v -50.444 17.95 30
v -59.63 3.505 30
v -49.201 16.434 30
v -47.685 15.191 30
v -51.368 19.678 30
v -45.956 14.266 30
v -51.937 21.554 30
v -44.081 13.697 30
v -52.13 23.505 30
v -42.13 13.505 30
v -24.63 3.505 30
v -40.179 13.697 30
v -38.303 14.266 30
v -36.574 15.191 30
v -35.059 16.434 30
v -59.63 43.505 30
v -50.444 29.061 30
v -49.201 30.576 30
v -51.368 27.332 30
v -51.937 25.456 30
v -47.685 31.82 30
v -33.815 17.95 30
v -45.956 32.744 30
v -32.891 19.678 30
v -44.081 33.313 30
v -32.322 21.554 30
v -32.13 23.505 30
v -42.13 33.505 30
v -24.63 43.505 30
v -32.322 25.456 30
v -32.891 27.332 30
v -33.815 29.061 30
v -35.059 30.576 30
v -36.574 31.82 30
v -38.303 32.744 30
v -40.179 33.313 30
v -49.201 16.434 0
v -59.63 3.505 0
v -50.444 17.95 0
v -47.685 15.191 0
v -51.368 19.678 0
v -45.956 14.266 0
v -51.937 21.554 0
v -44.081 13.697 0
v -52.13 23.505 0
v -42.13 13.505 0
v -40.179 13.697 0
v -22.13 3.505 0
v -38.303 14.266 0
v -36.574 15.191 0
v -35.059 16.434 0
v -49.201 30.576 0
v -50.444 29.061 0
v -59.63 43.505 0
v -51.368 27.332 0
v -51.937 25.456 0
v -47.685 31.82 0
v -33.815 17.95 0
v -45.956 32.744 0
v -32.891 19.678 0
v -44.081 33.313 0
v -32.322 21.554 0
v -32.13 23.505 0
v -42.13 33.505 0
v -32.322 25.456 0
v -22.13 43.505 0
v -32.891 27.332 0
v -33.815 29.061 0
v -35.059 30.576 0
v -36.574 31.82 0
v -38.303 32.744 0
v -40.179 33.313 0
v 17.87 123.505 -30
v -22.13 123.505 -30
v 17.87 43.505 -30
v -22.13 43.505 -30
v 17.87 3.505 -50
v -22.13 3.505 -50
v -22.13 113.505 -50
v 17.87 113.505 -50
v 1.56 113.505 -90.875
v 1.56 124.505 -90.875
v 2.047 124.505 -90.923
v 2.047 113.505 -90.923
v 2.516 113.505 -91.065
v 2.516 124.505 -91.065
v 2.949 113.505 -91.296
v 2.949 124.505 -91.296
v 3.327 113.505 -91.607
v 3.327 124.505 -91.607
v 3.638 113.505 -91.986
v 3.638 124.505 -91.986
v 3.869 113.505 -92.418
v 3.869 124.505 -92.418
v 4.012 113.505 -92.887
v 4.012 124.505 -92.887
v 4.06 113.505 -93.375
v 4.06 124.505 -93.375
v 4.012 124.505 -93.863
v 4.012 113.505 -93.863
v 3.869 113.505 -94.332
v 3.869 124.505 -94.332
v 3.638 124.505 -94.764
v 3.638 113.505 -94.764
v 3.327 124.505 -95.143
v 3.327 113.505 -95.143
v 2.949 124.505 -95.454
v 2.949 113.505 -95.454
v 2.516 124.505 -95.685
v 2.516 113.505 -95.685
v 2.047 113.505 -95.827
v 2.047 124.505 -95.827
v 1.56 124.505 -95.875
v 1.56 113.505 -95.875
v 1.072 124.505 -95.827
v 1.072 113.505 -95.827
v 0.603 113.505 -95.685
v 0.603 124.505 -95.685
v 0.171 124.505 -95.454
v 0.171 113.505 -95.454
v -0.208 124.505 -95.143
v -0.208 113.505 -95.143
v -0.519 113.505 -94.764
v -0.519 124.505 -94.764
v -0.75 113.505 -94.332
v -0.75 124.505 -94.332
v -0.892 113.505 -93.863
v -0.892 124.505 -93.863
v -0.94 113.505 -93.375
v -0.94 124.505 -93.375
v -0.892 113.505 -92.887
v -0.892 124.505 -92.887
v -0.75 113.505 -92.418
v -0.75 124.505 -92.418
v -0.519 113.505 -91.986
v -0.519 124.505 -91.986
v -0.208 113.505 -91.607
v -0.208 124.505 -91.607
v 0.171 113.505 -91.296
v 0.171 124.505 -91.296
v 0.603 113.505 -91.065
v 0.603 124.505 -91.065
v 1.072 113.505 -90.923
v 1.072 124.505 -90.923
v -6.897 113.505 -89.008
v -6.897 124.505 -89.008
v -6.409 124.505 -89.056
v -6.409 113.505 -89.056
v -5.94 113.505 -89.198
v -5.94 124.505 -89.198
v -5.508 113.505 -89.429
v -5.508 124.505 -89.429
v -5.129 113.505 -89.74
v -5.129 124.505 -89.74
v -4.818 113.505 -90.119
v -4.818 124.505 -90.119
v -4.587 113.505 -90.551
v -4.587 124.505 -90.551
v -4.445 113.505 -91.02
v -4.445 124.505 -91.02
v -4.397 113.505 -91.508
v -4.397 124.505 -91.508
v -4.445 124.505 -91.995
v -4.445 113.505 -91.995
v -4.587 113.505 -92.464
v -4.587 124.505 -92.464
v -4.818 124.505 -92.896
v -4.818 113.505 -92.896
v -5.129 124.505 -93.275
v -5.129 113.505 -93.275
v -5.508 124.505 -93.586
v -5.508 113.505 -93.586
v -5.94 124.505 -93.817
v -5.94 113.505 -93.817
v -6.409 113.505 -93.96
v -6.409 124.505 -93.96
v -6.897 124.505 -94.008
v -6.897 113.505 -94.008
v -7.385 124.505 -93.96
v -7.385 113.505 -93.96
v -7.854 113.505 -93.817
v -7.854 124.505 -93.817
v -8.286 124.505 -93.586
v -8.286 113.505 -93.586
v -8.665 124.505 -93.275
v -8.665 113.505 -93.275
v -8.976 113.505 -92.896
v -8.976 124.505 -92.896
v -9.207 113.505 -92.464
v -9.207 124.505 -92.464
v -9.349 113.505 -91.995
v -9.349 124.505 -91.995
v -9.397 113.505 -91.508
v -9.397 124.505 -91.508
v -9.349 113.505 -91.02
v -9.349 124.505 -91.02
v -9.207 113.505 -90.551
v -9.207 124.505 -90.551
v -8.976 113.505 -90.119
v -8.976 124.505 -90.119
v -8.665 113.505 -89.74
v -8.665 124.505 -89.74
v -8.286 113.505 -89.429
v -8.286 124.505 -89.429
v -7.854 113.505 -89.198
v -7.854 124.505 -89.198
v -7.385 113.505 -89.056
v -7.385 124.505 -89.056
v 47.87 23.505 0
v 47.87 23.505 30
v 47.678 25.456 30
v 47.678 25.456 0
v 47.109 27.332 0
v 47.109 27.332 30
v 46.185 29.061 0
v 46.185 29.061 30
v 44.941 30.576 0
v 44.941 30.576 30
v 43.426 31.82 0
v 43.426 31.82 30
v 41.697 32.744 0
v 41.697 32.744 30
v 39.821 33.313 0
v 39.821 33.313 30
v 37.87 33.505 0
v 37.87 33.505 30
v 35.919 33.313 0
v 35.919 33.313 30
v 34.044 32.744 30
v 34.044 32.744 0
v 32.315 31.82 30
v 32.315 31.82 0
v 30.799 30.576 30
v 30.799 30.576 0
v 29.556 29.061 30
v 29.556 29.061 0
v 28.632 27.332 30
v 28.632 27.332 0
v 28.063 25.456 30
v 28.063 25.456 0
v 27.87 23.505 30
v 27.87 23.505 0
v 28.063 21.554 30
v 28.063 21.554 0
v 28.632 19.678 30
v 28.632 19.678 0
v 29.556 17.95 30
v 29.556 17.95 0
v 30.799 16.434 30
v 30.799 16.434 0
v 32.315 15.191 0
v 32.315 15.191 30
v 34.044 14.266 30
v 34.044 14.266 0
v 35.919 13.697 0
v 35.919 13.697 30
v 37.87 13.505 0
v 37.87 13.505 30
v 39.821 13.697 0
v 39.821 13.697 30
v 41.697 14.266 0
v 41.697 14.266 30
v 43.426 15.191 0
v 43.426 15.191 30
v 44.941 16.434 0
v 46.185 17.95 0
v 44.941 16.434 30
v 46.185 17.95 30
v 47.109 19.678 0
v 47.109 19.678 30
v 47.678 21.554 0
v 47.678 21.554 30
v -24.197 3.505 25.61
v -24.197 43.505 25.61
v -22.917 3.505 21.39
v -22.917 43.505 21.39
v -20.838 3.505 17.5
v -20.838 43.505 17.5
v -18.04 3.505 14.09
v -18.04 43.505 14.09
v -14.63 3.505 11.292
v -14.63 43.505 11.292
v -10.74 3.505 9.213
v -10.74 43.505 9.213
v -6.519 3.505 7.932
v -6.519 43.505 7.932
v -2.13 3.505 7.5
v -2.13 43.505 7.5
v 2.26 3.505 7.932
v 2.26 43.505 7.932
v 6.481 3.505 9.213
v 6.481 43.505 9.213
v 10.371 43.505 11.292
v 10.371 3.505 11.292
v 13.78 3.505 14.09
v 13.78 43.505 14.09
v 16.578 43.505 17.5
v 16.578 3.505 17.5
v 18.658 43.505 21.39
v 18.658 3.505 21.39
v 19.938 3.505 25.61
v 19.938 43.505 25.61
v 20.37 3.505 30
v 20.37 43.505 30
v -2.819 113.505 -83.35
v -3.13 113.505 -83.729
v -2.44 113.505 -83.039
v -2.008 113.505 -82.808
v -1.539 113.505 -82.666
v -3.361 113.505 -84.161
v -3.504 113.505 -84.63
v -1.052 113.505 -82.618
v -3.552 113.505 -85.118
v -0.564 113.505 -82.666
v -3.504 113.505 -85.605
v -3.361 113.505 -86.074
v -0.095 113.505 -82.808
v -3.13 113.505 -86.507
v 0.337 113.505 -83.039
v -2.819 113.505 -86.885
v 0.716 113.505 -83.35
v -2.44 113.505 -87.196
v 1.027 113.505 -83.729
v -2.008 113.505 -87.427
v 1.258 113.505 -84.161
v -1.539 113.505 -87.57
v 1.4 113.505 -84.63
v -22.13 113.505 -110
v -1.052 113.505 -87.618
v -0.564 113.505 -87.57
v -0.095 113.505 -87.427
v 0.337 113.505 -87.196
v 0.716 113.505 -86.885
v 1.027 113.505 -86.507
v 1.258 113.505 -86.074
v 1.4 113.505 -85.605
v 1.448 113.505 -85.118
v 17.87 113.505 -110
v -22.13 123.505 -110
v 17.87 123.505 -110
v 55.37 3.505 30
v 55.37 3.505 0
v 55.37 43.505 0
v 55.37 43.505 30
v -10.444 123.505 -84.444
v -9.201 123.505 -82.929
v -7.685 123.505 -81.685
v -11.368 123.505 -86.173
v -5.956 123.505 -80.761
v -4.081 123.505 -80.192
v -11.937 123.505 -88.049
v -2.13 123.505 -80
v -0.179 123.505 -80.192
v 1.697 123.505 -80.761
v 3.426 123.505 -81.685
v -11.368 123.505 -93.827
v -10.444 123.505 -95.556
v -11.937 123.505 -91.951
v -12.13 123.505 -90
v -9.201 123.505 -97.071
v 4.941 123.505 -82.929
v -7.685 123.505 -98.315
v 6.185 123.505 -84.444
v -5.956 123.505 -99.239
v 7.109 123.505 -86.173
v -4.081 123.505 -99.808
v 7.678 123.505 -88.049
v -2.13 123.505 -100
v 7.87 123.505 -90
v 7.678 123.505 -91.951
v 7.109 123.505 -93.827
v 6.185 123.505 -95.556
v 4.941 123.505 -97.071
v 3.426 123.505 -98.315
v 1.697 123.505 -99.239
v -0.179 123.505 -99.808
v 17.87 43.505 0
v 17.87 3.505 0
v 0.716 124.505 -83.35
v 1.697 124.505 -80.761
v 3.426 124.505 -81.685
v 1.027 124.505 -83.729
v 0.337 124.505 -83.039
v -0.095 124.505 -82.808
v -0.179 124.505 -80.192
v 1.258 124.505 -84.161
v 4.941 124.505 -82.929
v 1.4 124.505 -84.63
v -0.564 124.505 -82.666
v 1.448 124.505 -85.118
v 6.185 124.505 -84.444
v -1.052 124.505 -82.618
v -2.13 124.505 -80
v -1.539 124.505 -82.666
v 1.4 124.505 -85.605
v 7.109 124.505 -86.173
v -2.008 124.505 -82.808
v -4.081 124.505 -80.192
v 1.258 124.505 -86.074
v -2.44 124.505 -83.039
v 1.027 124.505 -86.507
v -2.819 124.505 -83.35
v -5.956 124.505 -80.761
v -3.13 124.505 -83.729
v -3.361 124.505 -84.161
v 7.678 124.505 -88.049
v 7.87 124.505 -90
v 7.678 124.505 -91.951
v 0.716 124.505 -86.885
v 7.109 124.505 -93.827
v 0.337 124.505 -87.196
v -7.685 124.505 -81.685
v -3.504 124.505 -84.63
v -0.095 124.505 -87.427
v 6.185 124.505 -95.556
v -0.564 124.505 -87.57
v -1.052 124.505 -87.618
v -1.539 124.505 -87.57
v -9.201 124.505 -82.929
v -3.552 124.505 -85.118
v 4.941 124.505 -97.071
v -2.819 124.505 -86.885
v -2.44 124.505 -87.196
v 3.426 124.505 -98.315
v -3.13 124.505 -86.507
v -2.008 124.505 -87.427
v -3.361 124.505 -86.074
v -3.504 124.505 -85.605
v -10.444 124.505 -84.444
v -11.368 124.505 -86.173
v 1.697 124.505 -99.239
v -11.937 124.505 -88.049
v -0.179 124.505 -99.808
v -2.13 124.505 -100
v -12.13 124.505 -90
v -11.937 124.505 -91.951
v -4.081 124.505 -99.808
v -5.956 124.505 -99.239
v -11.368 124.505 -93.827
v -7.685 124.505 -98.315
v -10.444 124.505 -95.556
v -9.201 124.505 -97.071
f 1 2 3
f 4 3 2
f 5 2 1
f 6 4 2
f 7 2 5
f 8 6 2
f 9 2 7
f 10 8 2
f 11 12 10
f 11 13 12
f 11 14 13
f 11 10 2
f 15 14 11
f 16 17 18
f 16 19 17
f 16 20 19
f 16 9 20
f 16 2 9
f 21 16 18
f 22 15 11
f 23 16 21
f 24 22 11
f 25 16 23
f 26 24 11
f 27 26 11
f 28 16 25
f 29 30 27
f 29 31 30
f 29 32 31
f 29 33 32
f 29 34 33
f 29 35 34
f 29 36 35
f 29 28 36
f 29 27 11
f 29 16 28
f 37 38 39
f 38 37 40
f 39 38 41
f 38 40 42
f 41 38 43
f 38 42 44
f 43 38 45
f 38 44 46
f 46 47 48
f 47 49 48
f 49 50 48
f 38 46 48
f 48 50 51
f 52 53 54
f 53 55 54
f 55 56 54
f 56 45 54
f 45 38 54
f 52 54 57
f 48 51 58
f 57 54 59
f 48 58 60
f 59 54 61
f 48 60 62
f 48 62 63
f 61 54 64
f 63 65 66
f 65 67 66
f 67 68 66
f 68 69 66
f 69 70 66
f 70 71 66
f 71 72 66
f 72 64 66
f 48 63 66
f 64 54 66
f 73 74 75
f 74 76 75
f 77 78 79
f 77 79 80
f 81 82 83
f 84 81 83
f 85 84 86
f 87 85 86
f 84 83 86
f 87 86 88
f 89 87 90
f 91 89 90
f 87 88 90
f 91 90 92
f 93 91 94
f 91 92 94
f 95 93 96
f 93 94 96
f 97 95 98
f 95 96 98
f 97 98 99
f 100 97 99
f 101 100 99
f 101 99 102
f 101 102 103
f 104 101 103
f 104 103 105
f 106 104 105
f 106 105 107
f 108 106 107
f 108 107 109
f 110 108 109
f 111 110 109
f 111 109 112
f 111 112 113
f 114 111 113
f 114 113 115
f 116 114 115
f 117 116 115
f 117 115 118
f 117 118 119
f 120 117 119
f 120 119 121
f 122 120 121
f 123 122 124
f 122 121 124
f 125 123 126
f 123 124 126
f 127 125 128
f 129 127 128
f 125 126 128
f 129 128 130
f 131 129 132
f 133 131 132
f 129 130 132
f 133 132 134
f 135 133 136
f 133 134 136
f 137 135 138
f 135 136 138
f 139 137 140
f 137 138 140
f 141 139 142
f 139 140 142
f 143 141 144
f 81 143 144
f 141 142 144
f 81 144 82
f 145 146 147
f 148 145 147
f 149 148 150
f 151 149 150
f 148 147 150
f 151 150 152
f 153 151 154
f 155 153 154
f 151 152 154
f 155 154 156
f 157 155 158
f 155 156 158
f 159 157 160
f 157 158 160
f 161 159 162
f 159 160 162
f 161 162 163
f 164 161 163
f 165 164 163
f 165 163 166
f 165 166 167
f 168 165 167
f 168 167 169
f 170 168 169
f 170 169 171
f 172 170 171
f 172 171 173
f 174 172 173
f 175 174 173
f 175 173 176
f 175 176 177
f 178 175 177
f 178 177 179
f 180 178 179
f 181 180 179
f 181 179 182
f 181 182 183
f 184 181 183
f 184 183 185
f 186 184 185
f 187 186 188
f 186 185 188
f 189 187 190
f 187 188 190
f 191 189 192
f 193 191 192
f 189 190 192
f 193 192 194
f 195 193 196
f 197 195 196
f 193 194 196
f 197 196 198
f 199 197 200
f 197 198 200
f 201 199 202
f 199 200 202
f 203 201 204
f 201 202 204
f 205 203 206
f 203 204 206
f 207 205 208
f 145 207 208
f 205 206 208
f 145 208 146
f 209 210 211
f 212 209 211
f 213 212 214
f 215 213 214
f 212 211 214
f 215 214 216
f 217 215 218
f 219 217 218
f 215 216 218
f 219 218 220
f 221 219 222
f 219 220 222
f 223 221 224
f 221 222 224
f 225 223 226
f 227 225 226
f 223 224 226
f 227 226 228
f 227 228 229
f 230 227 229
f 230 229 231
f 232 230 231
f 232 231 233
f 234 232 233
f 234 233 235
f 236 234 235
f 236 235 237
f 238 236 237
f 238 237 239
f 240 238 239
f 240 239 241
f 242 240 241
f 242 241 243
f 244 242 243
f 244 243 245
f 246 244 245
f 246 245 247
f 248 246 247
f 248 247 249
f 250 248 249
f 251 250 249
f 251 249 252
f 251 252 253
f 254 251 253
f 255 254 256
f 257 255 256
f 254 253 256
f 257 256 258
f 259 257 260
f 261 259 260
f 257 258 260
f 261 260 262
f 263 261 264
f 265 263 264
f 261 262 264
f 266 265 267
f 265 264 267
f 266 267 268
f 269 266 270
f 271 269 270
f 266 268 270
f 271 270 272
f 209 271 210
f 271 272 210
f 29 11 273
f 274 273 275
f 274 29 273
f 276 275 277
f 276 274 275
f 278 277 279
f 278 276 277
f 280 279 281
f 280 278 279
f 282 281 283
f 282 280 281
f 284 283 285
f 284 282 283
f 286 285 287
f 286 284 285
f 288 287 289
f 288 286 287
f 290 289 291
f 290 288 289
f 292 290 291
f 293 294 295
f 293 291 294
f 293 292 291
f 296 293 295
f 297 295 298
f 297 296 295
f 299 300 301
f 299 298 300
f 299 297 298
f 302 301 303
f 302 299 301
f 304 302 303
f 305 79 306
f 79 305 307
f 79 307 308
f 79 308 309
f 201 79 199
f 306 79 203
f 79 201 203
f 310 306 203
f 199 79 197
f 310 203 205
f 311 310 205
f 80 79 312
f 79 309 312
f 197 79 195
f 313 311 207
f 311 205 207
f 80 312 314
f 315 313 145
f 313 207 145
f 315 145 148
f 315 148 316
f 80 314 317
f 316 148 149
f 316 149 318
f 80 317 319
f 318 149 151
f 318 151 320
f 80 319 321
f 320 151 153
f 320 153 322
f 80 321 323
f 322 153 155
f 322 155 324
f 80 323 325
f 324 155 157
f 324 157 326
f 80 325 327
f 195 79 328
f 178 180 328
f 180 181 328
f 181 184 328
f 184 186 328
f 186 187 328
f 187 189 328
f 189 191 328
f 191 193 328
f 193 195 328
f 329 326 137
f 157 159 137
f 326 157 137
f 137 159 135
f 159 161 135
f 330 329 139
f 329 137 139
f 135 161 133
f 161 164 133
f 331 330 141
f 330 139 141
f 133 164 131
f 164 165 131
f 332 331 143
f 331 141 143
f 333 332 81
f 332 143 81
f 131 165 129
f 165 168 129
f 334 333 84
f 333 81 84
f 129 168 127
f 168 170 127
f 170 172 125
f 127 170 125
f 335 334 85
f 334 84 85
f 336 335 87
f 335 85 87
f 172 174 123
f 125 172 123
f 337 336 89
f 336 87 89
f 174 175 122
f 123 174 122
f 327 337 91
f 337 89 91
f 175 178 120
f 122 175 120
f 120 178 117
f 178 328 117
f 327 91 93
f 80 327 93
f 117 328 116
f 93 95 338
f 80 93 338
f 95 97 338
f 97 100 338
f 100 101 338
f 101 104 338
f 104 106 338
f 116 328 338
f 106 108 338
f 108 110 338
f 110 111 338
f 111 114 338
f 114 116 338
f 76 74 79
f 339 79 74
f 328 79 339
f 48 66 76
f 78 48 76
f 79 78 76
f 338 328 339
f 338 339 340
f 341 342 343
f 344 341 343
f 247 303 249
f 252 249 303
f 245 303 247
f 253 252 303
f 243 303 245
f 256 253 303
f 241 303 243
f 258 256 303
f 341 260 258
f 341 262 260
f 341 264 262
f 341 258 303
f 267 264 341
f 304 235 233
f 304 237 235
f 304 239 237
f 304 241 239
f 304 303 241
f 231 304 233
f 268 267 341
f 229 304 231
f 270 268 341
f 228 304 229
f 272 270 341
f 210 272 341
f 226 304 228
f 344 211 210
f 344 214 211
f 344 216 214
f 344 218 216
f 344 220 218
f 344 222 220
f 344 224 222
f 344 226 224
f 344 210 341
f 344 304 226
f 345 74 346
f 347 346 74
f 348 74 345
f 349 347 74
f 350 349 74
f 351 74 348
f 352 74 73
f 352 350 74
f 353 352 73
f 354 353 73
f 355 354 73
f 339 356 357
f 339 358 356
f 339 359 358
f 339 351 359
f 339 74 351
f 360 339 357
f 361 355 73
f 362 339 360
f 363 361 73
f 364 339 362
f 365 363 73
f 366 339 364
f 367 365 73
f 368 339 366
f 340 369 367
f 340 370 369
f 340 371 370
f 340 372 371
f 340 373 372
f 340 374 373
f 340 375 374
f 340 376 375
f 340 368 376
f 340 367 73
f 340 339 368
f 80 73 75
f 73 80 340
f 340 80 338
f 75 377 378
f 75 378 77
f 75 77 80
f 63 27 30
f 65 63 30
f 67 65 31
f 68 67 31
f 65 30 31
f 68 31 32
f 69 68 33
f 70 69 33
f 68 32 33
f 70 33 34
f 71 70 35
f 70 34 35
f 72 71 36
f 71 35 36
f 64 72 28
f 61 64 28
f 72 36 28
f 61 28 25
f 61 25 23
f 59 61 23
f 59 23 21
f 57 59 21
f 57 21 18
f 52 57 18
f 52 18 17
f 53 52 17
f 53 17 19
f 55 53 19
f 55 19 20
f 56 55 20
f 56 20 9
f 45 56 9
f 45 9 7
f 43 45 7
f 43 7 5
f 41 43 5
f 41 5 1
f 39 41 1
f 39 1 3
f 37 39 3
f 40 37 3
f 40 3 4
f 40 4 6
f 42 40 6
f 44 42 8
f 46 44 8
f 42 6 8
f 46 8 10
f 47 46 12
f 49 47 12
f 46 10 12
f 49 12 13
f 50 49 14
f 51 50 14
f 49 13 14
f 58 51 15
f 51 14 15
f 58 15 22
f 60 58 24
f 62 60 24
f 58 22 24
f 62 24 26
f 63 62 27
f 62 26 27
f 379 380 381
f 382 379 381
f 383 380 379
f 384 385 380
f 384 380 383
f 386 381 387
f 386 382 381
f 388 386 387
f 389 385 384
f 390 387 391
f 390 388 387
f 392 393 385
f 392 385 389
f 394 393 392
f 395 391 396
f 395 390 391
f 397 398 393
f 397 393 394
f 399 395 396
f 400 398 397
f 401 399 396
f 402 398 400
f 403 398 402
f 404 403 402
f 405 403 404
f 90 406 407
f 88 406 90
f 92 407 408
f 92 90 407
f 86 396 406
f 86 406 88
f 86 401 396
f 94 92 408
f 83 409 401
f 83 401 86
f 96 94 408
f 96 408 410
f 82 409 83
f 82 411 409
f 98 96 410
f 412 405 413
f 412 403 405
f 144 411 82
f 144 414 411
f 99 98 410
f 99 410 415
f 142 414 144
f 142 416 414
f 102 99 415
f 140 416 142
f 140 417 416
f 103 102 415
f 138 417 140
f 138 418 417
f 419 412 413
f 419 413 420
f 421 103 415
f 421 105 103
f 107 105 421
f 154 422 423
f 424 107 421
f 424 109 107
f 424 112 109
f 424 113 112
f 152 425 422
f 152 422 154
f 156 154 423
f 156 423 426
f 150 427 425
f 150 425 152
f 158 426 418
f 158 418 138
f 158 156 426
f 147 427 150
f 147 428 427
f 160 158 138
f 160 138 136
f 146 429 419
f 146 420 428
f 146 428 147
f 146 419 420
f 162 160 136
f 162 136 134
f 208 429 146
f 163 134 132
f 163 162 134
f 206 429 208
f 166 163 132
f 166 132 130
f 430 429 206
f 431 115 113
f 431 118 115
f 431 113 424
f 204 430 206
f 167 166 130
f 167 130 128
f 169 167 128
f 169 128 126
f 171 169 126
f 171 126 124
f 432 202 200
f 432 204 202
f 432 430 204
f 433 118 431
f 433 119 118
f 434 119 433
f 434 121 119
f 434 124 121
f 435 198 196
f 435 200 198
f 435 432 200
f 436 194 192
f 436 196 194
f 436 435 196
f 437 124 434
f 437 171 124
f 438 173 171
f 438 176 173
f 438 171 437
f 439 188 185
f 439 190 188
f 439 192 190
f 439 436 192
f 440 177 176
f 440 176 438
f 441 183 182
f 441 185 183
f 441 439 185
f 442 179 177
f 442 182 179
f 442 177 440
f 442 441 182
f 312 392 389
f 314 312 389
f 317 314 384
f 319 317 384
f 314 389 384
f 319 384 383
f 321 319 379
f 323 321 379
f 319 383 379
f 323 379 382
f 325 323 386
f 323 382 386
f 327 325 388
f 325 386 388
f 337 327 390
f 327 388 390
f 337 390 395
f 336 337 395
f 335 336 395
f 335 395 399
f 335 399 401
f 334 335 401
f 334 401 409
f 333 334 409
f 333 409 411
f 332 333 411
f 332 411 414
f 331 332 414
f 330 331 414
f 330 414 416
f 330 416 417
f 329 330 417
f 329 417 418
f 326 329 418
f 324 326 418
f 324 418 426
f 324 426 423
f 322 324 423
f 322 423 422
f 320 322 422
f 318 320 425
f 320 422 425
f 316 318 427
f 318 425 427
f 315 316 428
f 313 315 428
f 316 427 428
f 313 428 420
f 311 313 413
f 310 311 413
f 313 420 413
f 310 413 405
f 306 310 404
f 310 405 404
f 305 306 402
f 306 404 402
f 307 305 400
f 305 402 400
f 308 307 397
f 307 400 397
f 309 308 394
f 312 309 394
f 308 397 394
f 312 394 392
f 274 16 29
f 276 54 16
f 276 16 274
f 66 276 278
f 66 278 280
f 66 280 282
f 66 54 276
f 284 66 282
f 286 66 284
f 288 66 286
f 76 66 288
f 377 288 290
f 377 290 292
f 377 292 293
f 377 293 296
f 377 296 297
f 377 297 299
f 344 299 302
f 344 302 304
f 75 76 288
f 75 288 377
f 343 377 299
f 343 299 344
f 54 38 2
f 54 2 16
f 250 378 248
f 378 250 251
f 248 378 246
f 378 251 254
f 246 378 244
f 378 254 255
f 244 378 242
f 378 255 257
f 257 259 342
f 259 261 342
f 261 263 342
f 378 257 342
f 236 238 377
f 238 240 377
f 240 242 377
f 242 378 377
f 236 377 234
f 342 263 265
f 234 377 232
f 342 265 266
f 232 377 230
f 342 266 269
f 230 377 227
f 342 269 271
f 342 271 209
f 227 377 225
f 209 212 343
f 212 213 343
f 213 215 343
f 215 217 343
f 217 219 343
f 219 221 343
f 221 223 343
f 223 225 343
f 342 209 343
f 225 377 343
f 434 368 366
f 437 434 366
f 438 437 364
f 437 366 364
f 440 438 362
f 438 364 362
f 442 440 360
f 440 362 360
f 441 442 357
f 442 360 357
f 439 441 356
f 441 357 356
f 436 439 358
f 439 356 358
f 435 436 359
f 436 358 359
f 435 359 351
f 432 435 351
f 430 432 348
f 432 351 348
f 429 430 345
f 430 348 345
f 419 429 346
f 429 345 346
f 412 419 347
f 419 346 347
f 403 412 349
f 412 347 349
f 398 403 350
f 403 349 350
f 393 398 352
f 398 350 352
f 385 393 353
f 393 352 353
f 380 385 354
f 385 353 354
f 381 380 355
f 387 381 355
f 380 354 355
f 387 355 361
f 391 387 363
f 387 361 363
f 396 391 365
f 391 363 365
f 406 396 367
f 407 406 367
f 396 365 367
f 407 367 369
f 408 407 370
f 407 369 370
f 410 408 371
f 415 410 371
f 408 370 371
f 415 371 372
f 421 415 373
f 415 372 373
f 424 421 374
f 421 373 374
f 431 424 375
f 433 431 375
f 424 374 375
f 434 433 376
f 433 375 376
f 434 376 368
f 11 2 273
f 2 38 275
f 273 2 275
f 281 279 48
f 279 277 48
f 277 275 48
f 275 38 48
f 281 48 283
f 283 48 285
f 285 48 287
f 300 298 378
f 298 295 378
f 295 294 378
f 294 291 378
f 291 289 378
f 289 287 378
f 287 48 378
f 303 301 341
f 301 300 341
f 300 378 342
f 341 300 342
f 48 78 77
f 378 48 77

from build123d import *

# Parameters (mm, degrees)
SKETCH2_W           = 115
SKETCH2_H           = 40
BOSS_EXTRUDE1_DEPTH = 60
CUT_EXTRUDE1_DEPTH  = 60
SKETCH4_R           = 10
CUT_EXTRUDE2_DEPTH  = 60
SKETCH5_W           = 40
SKETCH5_H           = 40
BOSS_EXTRUDE2_DEPTH = 50
SKETCH6_W           = 40
SKETCH6_H           = 20
BOSS_EXTRUDE3_DEPTH = 70
SKETCH7_W           = 40
SKETCH7_H           = 80
BOSS_EXTRUDE4_DEPTH = 10
SKETCH9_R           = 10
BOSS_EXTRUDE5_DEPTH = 1
SKETCH10_R          = 2.5
CUT_EXTRUDE3_DEPTH  = 15


with BuildPart() as part:
    # Sketch2 → Boss-Extrude1 (new body)
    with BuildSketch(Plane.XY):
        with Locations((-2.12962963, 23.505291005)):
            Rectangle(SKETCH2_W, SKETCH2_H)
    extrude(amount=BOSS_EXTRUDE1_DEPTH)

    # Sketch3 → Cut-Extrude1 (cut)
    with BuildSketch(Plane(origin=(0, 43.505291005, 0), x_dir=(1, 0, 0), z_dir=(0, 1, 0))):
        with BuildLine():
            Line((-59.62962963, -30), (-24.62962963, -30))
            ThreePointArc((-24.62962963, -30), (-2.12962963, -7.5), (20.37037037, -30))
            Line((20.37037037, -30), (55.37037037, -30))
            Line((55.37037037, -30), (55.37037037, -60))
            Line((55.37037037, -60), (-59.62962963, -60))
            Line((-59.62962963, -60), (-59.62962963, -30))
        make_face()
    extrude(amount=-CUT_EXTRUDE1_DEPTH, mode=Mode.SUBTRACT)

    # Sketch4 → Cut-Extrude2 (cut)
    with BuildSketch(Plane.XY.offset(30)):
        with Locations((-42.12962963, 23.505291005)):
            Circle(SKETCH4_R)
        with Locations((37.87037037, 23.505291005)):
            Circle(SKETCH4_R)
    extrude(amount=-CUT_EXTRUDE2_DEPTH, mode=Mode.SUBTRACT)

    # Sketch5 → Boss-Extrude2 (add)
    with BuildSketch(Plane(origin=(0, 0, 0), x_dir=(-1, 0, 0), z_dir=(0, 0, -1))):
        with Locations((2.12962963, 23.505291005)):
            Rectangle(SKETCH5_W, SKETCH5_H)
    extrude(amount=BOSS_EXTRUDE2_DEPTH)

    # Sketch6 → Boss-Extrude3 (add)
    with BuildSketch(Plane(origin=(0, 43.505291005, 0), x_dir=(1, 0, 0), z_dir=(0, 1, 0))):
        with Locations((-2.12962963, 40)):
            Rectangle(SKETCH6_W, SKETCH6_H)
    extrude(amount=BOSS_EXTRUDE3_DEPTH)

    # Sketch7 → Boss-Extrude4 (add)
    with BuildSketch(Plane(origin=(0, 113.505291005, 0), x_dir=(1, 0, 0), z_dir=(0, 1, 0))):
        with Locations((-2.12962963, 70)):
            Rectangle(SKETCH7_W, SKETCH7_H)
    extrude(amount=BOSS_EXTRUDE4_DEPTH)

    # Sketch9 → Boss-Extrude5 (add)
    with BuildSketch(Plane(origin=(0, 123.505291005, 0), x_dir=(1, 0, 0), z_dir=(0, 1, 0))):
        with Locations(Location((-2.12962963, 90, 0), (0, 0, 90))):
            Circle(SKETCH9_R)
    extrude(amount=BOSS_EXTRUDE5_DEPTH)

    # Sketch10 → Cut-Extrude3 (cut)
    with BuildSketch(Plane(origin=(0, 124.505291005, 0), x_dir=(1, 0, 0), z_dir=(0, 1, 0))):
        with Locations(Location((-6.896940429, 91.507563511, 0), (0, 0, 270))):
            Circle(SKETCH10_R)
        with Locations(Location((1.559614069, 93.374830505, 0), (0, 0, 270))):
            Circle(SKETCH10_R)
        with Locations(Location((-1.051562528, 85.117605984, 0), (0, 0, 270))):
            Circle(SKETCH10_R)
    extrude(amount=-CUT_EXTRUDE3_DEPTH, mode=Mode.SUBTRACT)


solid = part.part
